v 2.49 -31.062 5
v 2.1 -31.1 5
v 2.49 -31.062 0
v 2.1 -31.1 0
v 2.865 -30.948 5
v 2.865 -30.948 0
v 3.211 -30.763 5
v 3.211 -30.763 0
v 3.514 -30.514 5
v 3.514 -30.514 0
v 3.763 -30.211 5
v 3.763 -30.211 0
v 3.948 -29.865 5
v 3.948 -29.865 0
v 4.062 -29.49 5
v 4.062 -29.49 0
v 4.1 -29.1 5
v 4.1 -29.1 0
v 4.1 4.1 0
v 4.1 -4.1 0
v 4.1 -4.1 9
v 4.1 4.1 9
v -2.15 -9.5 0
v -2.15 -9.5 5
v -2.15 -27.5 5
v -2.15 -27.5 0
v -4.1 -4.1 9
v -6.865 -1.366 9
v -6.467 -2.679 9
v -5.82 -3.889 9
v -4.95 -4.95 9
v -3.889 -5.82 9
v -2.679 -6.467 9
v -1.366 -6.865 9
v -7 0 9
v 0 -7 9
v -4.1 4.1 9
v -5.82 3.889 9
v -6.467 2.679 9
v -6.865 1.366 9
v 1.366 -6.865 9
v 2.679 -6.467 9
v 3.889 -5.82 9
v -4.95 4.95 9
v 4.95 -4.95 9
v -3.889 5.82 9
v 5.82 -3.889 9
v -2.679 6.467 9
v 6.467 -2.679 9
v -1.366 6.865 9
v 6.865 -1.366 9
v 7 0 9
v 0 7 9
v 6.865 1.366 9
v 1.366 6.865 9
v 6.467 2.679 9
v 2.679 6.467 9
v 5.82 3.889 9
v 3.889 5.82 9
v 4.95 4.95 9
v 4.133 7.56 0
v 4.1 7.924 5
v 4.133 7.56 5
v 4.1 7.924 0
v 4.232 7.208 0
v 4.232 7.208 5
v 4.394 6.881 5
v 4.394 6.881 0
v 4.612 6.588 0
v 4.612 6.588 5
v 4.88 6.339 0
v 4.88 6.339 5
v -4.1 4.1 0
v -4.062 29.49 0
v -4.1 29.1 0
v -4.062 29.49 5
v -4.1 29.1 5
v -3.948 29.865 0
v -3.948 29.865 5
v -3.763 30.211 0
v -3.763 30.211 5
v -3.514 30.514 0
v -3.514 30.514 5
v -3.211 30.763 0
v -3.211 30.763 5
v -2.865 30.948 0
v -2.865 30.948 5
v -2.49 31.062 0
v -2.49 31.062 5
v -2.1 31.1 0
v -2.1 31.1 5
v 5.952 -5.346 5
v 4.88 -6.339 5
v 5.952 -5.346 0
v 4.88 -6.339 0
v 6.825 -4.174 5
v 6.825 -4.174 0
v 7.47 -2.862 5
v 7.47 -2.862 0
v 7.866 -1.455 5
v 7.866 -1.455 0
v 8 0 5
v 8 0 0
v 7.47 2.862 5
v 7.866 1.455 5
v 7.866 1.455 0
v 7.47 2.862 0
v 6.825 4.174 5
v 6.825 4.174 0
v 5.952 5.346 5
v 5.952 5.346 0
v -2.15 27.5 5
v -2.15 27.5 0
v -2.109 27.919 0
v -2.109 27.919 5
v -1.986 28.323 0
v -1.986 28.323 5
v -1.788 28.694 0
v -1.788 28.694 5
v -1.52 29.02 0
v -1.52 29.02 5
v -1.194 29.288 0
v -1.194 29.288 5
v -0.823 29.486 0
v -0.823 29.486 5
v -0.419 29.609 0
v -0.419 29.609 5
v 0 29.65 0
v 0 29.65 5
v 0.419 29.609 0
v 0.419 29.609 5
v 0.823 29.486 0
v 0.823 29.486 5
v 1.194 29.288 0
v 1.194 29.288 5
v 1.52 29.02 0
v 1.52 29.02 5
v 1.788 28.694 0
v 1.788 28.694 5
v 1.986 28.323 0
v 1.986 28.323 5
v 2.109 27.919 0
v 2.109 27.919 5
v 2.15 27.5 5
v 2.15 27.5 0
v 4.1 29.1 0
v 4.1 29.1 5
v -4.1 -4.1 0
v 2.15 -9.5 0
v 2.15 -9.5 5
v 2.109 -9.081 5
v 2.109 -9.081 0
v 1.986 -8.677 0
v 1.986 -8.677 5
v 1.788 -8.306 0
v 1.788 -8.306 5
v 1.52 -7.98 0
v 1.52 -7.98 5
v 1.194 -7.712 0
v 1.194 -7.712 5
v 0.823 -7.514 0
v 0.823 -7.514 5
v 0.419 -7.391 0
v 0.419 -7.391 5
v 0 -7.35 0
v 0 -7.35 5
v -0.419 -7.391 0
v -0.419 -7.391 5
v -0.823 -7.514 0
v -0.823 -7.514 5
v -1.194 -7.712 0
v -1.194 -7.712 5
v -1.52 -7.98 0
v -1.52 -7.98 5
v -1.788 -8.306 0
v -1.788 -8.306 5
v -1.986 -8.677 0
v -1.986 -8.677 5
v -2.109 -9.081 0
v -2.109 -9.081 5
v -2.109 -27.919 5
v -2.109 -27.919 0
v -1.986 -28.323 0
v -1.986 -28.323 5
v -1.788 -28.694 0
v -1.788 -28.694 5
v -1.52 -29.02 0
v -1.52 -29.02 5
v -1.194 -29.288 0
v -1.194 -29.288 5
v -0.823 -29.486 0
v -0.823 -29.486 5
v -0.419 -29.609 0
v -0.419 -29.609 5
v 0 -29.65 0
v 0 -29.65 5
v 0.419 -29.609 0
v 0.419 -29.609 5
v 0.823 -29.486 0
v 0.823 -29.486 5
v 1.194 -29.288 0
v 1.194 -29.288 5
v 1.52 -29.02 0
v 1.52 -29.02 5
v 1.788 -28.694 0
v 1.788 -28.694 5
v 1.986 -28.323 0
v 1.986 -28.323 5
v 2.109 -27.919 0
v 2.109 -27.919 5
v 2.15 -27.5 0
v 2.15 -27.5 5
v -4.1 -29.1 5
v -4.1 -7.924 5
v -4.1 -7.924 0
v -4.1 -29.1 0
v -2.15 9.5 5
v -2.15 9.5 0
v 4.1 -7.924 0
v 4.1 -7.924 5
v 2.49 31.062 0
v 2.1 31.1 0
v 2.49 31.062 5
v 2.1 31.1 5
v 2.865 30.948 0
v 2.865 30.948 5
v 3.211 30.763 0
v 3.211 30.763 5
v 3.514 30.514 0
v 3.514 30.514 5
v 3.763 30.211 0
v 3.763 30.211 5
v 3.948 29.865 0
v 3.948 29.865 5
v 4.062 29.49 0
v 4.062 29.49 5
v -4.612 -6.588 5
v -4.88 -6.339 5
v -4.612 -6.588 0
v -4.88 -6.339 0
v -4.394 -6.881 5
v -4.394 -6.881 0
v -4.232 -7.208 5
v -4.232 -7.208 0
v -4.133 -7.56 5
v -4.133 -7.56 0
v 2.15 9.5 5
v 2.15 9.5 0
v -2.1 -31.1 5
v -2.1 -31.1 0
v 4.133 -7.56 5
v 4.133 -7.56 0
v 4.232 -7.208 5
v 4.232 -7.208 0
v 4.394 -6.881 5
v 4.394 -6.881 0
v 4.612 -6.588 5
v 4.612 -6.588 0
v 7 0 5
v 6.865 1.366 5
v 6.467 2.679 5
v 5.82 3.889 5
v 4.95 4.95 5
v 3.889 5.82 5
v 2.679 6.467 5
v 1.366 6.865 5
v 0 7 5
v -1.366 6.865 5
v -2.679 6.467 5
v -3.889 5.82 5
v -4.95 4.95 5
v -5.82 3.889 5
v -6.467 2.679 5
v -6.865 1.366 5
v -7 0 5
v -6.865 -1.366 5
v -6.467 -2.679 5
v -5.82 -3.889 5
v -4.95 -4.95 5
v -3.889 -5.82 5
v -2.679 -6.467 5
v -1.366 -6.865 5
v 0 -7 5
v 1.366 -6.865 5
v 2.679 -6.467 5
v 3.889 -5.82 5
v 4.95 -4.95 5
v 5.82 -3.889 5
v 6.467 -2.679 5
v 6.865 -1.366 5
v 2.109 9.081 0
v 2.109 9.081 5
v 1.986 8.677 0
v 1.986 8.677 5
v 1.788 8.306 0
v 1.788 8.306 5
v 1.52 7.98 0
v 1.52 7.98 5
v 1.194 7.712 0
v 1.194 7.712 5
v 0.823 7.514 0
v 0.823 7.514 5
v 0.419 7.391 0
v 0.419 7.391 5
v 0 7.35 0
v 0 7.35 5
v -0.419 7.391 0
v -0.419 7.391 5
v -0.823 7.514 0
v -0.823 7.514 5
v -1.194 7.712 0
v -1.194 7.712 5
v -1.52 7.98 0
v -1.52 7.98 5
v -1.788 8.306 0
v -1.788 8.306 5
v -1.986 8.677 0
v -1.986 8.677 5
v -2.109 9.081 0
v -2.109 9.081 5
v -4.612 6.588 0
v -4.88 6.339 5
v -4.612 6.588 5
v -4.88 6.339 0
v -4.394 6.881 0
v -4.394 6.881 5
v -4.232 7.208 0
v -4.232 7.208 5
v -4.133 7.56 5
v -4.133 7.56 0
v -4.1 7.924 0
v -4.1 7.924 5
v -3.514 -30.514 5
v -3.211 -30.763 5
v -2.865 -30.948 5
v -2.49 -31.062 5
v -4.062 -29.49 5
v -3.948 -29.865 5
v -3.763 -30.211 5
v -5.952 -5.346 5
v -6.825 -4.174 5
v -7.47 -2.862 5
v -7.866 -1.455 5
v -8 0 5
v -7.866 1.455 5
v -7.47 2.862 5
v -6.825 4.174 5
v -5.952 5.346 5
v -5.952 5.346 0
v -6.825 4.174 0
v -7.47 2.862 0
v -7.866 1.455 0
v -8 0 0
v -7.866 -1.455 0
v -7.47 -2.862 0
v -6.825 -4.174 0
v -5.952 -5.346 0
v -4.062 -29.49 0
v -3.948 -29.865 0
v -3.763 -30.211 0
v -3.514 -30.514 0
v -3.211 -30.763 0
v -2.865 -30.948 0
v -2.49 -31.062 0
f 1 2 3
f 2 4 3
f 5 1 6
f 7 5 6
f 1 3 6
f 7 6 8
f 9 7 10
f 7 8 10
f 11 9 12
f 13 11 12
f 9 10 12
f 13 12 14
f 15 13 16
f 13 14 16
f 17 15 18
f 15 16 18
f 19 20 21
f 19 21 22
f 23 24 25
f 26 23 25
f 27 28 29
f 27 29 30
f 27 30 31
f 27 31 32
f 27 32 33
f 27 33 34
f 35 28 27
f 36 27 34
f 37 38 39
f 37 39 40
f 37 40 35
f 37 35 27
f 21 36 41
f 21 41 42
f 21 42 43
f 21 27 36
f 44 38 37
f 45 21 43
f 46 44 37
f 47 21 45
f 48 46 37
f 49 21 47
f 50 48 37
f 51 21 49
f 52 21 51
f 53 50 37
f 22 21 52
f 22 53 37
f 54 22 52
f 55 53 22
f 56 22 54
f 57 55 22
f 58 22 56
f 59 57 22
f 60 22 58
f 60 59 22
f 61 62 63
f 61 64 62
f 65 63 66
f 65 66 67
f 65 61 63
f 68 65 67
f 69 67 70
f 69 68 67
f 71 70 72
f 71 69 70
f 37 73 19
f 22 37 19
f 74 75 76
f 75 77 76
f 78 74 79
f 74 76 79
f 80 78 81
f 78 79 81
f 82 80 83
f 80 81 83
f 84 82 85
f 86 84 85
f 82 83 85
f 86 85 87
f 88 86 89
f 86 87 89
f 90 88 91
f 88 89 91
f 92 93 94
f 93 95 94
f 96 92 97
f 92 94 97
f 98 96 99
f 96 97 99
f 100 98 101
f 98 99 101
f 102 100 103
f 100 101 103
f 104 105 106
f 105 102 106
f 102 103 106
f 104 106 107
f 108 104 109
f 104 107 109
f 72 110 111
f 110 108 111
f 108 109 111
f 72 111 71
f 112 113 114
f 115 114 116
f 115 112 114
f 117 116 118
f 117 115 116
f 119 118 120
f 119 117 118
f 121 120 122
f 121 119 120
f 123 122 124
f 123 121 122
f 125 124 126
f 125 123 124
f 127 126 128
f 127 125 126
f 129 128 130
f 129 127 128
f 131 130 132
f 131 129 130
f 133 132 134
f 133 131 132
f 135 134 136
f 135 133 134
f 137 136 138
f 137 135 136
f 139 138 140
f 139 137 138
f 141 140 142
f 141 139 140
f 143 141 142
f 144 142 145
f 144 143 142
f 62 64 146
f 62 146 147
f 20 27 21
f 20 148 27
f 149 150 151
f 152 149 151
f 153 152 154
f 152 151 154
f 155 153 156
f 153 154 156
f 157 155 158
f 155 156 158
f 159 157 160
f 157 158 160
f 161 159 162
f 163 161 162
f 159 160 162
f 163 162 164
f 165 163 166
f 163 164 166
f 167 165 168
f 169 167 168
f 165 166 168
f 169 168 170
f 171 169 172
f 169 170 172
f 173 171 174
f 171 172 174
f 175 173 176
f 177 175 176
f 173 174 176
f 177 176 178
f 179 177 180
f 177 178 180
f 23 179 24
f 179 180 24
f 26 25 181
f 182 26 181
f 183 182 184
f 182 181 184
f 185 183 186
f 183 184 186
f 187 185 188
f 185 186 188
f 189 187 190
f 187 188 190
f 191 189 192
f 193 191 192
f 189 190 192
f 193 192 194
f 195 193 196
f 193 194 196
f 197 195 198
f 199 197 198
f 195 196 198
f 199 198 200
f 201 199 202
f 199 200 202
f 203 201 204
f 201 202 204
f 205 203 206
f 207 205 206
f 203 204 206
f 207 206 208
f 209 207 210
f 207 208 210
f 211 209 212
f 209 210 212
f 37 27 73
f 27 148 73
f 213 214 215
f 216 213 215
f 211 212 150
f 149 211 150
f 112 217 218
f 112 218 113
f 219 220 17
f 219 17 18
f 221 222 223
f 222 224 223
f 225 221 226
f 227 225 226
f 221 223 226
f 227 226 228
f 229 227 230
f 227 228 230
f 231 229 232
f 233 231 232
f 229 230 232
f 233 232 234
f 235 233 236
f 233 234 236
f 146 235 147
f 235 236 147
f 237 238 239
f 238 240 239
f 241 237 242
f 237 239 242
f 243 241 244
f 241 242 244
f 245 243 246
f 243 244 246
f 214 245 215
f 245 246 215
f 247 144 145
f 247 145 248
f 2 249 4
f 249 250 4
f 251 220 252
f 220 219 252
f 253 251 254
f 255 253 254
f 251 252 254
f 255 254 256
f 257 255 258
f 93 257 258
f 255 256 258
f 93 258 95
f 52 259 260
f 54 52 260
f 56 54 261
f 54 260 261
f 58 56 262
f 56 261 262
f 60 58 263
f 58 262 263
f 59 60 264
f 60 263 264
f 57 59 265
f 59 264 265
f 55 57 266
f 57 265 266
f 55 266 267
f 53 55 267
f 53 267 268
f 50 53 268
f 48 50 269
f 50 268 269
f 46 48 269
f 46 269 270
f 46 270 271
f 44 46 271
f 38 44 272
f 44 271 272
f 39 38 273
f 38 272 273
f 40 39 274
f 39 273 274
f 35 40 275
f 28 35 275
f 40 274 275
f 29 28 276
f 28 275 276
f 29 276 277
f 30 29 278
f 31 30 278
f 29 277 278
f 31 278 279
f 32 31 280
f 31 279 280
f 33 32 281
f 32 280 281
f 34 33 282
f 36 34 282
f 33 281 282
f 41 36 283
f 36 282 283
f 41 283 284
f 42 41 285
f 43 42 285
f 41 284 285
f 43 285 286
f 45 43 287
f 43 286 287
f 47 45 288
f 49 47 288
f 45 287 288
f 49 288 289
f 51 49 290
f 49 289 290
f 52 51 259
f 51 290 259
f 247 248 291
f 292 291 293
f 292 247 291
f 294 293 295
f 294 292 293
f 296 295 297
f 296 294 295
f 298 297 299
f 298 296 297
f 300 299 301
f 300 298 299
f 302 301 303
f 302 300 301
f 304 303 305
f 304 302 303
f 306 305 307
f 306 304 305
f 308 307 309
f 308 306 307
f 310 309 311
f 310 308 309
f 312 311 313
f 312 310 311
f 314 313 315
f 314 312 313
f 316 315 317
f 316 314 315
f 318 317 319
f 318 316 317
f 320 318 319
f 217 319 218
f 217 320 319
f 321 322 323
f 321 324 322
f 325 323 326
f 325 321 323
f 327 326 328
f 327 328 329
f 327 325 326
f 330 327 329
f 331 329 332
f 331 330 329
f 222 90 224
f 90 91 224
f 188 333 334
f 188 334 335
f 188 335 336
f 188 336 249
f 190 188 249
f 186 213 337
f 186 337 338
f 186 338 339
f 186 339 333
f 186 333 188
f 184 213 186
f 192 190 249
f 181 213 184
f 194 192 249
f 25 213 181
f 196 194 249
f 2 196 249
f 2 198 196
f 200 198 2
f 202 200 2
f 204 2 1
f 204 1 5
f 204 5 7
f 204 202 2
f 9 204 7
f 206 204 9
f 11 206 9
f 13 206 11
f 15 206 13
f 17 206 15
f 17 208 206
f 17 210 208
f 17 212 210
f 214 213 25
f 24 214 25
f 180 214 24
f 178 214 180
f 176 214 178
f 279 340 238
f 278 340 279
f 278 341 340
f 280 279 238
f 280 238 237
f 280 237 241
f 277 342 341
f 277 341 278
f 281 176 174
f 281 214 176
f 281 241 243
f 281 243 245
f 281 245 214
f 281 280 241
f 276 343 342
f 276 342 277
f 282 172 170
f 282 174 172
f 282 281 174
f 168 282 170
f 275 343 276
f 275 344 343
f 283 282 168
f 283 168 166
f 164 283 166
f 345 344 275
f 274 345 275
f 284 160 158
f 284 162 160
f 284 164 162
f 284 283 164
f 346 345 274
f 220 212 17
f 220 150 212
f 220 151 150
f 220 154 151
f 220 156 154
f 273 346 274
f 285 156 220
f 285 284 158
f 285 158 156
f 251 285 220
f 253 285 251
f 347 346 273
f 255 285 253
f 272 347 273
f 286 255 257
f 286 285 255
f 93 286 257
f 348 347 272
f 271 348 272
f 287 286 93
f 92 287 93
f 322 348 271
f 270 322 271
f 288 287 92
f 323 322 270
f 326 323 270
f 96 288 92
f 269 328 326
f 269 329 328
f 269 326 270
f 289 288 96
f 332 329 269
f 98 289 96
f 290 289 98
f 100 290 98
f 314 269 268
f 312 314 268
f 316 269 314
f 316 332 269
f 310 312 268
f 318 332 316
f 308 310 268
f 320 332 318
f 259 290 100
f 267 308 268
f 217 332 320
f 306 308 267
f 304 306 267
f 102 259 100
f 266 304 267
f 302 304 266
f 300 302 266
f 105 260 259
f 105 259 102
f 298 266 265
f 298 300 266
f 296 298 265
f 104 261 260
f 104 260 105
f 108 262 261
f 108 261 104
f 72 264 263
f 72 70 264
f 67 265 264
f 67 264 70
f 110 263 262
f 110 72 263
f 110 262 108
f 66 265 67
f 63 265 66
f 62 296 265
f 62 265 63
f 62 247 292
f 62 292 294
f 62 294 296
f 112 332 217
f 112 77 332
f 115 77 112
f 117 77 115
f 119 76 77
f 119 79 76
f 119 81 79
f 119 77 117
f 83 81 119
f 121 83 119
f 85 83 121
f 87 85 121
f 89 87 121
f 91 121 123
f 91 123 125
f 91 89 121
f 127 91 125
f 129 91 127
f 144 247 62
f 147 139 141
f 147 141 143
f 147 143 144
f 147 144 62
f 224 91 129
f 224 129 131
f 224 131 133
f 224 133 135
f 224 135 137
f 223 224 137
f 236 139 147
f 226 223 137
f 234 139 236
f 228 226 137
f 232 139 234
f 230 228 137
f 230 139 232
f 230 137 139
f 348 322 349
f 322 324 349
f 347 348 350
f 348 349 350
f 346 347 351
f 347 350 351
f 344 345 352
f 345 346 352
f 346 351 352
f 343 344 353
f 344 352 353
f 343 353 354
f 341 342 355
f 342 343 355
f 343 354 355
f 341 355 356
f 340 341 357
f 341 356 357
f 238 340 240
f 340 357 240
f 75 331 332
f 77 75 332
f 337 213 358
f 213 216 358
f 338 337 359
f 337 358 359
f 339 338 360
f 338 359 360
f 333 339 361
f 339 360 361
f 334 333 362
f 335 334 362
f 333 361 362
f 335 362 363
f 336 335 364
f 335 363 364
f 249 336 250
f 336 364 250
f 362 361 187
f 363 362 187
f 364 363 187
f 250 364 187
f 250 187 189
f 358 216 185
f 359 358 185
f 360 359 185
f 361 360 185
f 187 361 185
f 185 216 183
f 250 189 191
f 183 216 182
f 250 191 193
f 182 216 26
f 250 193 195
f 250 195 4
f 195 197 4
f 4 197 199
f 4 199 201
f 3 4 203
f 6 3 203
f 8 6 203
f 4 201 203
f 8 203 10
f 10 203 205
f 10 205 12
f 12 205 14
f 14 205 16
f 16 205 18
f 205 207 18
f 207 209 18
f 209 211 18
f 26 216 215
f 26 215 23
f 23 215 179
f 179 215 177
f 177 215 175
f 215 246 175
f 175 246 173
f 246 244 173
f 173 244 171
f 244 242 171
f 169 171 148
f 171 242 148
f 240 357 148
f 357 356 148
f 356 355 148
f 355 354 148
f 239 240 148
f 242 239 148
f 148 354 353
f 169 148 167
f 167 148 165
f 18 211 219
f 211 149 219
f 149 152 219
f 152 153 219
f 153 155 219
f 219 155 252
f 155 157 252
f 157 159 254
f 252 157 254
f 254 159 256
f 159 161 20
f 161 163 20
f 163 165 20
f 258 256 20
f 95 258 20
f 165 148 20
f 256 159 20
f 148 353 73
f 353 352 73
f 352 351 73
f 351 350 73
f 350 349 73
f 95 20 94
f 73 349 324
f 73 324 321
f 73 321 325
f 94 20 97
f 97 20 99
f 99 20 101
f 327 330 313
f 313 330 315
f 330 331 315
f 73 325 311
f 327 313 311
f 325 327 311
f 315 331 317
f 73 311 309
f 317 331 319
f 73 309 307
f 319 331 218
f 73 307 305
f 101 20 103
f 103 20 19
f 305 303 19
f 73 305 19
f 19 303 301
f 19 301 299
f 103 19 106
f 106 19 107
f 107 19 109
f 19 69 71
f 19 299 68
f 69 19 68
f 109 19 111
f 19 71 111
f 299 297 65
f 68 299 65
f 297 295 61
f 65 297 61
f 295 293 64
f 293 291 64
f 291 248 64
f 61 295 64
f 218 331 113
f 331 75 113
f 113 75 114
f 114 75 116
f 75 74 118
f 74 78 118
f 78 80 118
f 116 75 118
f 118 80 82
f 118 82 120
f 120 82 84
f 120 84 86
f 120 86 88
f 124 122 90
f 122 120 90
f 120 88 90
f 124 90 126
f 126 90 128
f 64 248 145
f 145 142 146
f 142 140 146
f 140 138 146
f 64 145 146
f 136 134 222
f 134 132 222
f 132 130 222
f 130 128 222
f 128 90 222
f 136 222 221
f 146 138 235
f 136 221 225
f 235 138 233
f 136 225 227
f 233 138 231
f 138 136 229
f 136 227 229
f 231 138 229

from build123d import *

# Parameters (mm, degrees)
SKETCH_1_R          = 8
SKETCH_1_W          = 8.2
SKETCH_1_H          = 8.2
EXTRUDE_1_DEPTH     = 5
SKETCH_2_W          = 8.2
SKETCH_2_H          = 5
EXTRUDE_2_DEPTH     = 27
SKETCH_3_W          = 8.2
SKETCH_3_H          = 5
EXTRUDE_3_DEPTH     = 27
SKETCH_4_R          = 7
SKETCH_4_W          = 8.2
SKETCH_4_H          = 8.2
EXTRUDE_4_DEPTH     = 4
CUT_EXTRUDE_1_DEPTH = 6
FILLET_1_R          = 2
FILLET_2_R          = 2


with BuildPart() as part:
    # 草图1 → 凸台-拉伸1 (new body)
    with BuildSketch(Plane.XY):
        Circle(SKETCH_1_R)
        Rectangle(SKETCH_1_W, SKETCH_1_H, mode=Mode.SUBTRACT)
    extrude(amount=EXTRUDE_1_DEPTH)

    # 草图2 → 凸台-拉伸2 (add)
    with BuildSketch(Plane.XZ.offset(-4.1)):
        with Locations((0, 2.5)):
            Rectangle(SKETCH_2_W, SKETCH_2_H)
    extrude(amount=-EXTRUDE_2_DEPTH)

    # 草图3 → 凸台-拉伸3 (add)
    with BuildSketch(Plane(origin=(0, -4.1, 0), x_dir=(1, 0, 0), z_dir=(0, 1, 0))):
        with Locations((0, -2.5)):
            Rectangle(SKETCH_3_W, SKETCH_3_H)
    extrude(amount=-EXTRUDE_3_DEPTH)

    # 草图4 → 凸台-拉伸4 (add)
    with BuildSketch(Plane.XY.offset(5)):
        Circle(SKETCH_4_R)
        Rectangle(SKETCH_4_W, SKETCH_4_H, mode=Mode.SUBTRACT)
    extrude(amount=EXTRUDE_4_DEPTH)

    # 草图5 → 切除-拉伸1 (cut, through all)
    with BuildSketch(Plane.XY.offset(5)):
        with BuildLine():
            Line((2.15, 27.5), (2.15, 9.5))
            ThreePointArc((2.15, 9.5), (0, 7.35), (-2.15, 9.5))
            Line((-2.15, 9.5), (-2.15, 27.5))
            ThreePointArc((-2.15, 27.5), (0, 29.65), (2.15, 27.5))
        make_face()
    cut_extrude_1 = extrude(amount=-CUT_EXTRUDE_1_DEPTH, mode=Mode.SUBTRACT)

    # 镜向1: 切除-拉伸1 across plane
    add(cut_extrude_1.mirror(Plane.ZX), mode=Mode.SUBTRACT)

    # 圆角1
    fillet_1_edges = [part.edges().sort_by_distance(p)[0] for p in [
        (-4.1, 6.869497798, 2.5),
        (4.1, 6.869497798, 2.5),
        (4.1, -6.869497798, 2.5),
        (-4.1, -6.869497798, 2.5),
    ]]
    fillet(fillet_1_edges, radius=FILLET_1_R)

    # 圆角2
    fillet_2_edges = [part.edges().sort_by_distance(p)[0] for p in [
        (-4.1, 31.1, 2.5),
        (4.1, 31.1, 2.5),
        (4.1, -31.1, 2.5),
        (-4.1, -31.1, 2.5),
    ]]
    fillet(fillet_2_edges, radius=FILLET_2_R)


solid = part.part
